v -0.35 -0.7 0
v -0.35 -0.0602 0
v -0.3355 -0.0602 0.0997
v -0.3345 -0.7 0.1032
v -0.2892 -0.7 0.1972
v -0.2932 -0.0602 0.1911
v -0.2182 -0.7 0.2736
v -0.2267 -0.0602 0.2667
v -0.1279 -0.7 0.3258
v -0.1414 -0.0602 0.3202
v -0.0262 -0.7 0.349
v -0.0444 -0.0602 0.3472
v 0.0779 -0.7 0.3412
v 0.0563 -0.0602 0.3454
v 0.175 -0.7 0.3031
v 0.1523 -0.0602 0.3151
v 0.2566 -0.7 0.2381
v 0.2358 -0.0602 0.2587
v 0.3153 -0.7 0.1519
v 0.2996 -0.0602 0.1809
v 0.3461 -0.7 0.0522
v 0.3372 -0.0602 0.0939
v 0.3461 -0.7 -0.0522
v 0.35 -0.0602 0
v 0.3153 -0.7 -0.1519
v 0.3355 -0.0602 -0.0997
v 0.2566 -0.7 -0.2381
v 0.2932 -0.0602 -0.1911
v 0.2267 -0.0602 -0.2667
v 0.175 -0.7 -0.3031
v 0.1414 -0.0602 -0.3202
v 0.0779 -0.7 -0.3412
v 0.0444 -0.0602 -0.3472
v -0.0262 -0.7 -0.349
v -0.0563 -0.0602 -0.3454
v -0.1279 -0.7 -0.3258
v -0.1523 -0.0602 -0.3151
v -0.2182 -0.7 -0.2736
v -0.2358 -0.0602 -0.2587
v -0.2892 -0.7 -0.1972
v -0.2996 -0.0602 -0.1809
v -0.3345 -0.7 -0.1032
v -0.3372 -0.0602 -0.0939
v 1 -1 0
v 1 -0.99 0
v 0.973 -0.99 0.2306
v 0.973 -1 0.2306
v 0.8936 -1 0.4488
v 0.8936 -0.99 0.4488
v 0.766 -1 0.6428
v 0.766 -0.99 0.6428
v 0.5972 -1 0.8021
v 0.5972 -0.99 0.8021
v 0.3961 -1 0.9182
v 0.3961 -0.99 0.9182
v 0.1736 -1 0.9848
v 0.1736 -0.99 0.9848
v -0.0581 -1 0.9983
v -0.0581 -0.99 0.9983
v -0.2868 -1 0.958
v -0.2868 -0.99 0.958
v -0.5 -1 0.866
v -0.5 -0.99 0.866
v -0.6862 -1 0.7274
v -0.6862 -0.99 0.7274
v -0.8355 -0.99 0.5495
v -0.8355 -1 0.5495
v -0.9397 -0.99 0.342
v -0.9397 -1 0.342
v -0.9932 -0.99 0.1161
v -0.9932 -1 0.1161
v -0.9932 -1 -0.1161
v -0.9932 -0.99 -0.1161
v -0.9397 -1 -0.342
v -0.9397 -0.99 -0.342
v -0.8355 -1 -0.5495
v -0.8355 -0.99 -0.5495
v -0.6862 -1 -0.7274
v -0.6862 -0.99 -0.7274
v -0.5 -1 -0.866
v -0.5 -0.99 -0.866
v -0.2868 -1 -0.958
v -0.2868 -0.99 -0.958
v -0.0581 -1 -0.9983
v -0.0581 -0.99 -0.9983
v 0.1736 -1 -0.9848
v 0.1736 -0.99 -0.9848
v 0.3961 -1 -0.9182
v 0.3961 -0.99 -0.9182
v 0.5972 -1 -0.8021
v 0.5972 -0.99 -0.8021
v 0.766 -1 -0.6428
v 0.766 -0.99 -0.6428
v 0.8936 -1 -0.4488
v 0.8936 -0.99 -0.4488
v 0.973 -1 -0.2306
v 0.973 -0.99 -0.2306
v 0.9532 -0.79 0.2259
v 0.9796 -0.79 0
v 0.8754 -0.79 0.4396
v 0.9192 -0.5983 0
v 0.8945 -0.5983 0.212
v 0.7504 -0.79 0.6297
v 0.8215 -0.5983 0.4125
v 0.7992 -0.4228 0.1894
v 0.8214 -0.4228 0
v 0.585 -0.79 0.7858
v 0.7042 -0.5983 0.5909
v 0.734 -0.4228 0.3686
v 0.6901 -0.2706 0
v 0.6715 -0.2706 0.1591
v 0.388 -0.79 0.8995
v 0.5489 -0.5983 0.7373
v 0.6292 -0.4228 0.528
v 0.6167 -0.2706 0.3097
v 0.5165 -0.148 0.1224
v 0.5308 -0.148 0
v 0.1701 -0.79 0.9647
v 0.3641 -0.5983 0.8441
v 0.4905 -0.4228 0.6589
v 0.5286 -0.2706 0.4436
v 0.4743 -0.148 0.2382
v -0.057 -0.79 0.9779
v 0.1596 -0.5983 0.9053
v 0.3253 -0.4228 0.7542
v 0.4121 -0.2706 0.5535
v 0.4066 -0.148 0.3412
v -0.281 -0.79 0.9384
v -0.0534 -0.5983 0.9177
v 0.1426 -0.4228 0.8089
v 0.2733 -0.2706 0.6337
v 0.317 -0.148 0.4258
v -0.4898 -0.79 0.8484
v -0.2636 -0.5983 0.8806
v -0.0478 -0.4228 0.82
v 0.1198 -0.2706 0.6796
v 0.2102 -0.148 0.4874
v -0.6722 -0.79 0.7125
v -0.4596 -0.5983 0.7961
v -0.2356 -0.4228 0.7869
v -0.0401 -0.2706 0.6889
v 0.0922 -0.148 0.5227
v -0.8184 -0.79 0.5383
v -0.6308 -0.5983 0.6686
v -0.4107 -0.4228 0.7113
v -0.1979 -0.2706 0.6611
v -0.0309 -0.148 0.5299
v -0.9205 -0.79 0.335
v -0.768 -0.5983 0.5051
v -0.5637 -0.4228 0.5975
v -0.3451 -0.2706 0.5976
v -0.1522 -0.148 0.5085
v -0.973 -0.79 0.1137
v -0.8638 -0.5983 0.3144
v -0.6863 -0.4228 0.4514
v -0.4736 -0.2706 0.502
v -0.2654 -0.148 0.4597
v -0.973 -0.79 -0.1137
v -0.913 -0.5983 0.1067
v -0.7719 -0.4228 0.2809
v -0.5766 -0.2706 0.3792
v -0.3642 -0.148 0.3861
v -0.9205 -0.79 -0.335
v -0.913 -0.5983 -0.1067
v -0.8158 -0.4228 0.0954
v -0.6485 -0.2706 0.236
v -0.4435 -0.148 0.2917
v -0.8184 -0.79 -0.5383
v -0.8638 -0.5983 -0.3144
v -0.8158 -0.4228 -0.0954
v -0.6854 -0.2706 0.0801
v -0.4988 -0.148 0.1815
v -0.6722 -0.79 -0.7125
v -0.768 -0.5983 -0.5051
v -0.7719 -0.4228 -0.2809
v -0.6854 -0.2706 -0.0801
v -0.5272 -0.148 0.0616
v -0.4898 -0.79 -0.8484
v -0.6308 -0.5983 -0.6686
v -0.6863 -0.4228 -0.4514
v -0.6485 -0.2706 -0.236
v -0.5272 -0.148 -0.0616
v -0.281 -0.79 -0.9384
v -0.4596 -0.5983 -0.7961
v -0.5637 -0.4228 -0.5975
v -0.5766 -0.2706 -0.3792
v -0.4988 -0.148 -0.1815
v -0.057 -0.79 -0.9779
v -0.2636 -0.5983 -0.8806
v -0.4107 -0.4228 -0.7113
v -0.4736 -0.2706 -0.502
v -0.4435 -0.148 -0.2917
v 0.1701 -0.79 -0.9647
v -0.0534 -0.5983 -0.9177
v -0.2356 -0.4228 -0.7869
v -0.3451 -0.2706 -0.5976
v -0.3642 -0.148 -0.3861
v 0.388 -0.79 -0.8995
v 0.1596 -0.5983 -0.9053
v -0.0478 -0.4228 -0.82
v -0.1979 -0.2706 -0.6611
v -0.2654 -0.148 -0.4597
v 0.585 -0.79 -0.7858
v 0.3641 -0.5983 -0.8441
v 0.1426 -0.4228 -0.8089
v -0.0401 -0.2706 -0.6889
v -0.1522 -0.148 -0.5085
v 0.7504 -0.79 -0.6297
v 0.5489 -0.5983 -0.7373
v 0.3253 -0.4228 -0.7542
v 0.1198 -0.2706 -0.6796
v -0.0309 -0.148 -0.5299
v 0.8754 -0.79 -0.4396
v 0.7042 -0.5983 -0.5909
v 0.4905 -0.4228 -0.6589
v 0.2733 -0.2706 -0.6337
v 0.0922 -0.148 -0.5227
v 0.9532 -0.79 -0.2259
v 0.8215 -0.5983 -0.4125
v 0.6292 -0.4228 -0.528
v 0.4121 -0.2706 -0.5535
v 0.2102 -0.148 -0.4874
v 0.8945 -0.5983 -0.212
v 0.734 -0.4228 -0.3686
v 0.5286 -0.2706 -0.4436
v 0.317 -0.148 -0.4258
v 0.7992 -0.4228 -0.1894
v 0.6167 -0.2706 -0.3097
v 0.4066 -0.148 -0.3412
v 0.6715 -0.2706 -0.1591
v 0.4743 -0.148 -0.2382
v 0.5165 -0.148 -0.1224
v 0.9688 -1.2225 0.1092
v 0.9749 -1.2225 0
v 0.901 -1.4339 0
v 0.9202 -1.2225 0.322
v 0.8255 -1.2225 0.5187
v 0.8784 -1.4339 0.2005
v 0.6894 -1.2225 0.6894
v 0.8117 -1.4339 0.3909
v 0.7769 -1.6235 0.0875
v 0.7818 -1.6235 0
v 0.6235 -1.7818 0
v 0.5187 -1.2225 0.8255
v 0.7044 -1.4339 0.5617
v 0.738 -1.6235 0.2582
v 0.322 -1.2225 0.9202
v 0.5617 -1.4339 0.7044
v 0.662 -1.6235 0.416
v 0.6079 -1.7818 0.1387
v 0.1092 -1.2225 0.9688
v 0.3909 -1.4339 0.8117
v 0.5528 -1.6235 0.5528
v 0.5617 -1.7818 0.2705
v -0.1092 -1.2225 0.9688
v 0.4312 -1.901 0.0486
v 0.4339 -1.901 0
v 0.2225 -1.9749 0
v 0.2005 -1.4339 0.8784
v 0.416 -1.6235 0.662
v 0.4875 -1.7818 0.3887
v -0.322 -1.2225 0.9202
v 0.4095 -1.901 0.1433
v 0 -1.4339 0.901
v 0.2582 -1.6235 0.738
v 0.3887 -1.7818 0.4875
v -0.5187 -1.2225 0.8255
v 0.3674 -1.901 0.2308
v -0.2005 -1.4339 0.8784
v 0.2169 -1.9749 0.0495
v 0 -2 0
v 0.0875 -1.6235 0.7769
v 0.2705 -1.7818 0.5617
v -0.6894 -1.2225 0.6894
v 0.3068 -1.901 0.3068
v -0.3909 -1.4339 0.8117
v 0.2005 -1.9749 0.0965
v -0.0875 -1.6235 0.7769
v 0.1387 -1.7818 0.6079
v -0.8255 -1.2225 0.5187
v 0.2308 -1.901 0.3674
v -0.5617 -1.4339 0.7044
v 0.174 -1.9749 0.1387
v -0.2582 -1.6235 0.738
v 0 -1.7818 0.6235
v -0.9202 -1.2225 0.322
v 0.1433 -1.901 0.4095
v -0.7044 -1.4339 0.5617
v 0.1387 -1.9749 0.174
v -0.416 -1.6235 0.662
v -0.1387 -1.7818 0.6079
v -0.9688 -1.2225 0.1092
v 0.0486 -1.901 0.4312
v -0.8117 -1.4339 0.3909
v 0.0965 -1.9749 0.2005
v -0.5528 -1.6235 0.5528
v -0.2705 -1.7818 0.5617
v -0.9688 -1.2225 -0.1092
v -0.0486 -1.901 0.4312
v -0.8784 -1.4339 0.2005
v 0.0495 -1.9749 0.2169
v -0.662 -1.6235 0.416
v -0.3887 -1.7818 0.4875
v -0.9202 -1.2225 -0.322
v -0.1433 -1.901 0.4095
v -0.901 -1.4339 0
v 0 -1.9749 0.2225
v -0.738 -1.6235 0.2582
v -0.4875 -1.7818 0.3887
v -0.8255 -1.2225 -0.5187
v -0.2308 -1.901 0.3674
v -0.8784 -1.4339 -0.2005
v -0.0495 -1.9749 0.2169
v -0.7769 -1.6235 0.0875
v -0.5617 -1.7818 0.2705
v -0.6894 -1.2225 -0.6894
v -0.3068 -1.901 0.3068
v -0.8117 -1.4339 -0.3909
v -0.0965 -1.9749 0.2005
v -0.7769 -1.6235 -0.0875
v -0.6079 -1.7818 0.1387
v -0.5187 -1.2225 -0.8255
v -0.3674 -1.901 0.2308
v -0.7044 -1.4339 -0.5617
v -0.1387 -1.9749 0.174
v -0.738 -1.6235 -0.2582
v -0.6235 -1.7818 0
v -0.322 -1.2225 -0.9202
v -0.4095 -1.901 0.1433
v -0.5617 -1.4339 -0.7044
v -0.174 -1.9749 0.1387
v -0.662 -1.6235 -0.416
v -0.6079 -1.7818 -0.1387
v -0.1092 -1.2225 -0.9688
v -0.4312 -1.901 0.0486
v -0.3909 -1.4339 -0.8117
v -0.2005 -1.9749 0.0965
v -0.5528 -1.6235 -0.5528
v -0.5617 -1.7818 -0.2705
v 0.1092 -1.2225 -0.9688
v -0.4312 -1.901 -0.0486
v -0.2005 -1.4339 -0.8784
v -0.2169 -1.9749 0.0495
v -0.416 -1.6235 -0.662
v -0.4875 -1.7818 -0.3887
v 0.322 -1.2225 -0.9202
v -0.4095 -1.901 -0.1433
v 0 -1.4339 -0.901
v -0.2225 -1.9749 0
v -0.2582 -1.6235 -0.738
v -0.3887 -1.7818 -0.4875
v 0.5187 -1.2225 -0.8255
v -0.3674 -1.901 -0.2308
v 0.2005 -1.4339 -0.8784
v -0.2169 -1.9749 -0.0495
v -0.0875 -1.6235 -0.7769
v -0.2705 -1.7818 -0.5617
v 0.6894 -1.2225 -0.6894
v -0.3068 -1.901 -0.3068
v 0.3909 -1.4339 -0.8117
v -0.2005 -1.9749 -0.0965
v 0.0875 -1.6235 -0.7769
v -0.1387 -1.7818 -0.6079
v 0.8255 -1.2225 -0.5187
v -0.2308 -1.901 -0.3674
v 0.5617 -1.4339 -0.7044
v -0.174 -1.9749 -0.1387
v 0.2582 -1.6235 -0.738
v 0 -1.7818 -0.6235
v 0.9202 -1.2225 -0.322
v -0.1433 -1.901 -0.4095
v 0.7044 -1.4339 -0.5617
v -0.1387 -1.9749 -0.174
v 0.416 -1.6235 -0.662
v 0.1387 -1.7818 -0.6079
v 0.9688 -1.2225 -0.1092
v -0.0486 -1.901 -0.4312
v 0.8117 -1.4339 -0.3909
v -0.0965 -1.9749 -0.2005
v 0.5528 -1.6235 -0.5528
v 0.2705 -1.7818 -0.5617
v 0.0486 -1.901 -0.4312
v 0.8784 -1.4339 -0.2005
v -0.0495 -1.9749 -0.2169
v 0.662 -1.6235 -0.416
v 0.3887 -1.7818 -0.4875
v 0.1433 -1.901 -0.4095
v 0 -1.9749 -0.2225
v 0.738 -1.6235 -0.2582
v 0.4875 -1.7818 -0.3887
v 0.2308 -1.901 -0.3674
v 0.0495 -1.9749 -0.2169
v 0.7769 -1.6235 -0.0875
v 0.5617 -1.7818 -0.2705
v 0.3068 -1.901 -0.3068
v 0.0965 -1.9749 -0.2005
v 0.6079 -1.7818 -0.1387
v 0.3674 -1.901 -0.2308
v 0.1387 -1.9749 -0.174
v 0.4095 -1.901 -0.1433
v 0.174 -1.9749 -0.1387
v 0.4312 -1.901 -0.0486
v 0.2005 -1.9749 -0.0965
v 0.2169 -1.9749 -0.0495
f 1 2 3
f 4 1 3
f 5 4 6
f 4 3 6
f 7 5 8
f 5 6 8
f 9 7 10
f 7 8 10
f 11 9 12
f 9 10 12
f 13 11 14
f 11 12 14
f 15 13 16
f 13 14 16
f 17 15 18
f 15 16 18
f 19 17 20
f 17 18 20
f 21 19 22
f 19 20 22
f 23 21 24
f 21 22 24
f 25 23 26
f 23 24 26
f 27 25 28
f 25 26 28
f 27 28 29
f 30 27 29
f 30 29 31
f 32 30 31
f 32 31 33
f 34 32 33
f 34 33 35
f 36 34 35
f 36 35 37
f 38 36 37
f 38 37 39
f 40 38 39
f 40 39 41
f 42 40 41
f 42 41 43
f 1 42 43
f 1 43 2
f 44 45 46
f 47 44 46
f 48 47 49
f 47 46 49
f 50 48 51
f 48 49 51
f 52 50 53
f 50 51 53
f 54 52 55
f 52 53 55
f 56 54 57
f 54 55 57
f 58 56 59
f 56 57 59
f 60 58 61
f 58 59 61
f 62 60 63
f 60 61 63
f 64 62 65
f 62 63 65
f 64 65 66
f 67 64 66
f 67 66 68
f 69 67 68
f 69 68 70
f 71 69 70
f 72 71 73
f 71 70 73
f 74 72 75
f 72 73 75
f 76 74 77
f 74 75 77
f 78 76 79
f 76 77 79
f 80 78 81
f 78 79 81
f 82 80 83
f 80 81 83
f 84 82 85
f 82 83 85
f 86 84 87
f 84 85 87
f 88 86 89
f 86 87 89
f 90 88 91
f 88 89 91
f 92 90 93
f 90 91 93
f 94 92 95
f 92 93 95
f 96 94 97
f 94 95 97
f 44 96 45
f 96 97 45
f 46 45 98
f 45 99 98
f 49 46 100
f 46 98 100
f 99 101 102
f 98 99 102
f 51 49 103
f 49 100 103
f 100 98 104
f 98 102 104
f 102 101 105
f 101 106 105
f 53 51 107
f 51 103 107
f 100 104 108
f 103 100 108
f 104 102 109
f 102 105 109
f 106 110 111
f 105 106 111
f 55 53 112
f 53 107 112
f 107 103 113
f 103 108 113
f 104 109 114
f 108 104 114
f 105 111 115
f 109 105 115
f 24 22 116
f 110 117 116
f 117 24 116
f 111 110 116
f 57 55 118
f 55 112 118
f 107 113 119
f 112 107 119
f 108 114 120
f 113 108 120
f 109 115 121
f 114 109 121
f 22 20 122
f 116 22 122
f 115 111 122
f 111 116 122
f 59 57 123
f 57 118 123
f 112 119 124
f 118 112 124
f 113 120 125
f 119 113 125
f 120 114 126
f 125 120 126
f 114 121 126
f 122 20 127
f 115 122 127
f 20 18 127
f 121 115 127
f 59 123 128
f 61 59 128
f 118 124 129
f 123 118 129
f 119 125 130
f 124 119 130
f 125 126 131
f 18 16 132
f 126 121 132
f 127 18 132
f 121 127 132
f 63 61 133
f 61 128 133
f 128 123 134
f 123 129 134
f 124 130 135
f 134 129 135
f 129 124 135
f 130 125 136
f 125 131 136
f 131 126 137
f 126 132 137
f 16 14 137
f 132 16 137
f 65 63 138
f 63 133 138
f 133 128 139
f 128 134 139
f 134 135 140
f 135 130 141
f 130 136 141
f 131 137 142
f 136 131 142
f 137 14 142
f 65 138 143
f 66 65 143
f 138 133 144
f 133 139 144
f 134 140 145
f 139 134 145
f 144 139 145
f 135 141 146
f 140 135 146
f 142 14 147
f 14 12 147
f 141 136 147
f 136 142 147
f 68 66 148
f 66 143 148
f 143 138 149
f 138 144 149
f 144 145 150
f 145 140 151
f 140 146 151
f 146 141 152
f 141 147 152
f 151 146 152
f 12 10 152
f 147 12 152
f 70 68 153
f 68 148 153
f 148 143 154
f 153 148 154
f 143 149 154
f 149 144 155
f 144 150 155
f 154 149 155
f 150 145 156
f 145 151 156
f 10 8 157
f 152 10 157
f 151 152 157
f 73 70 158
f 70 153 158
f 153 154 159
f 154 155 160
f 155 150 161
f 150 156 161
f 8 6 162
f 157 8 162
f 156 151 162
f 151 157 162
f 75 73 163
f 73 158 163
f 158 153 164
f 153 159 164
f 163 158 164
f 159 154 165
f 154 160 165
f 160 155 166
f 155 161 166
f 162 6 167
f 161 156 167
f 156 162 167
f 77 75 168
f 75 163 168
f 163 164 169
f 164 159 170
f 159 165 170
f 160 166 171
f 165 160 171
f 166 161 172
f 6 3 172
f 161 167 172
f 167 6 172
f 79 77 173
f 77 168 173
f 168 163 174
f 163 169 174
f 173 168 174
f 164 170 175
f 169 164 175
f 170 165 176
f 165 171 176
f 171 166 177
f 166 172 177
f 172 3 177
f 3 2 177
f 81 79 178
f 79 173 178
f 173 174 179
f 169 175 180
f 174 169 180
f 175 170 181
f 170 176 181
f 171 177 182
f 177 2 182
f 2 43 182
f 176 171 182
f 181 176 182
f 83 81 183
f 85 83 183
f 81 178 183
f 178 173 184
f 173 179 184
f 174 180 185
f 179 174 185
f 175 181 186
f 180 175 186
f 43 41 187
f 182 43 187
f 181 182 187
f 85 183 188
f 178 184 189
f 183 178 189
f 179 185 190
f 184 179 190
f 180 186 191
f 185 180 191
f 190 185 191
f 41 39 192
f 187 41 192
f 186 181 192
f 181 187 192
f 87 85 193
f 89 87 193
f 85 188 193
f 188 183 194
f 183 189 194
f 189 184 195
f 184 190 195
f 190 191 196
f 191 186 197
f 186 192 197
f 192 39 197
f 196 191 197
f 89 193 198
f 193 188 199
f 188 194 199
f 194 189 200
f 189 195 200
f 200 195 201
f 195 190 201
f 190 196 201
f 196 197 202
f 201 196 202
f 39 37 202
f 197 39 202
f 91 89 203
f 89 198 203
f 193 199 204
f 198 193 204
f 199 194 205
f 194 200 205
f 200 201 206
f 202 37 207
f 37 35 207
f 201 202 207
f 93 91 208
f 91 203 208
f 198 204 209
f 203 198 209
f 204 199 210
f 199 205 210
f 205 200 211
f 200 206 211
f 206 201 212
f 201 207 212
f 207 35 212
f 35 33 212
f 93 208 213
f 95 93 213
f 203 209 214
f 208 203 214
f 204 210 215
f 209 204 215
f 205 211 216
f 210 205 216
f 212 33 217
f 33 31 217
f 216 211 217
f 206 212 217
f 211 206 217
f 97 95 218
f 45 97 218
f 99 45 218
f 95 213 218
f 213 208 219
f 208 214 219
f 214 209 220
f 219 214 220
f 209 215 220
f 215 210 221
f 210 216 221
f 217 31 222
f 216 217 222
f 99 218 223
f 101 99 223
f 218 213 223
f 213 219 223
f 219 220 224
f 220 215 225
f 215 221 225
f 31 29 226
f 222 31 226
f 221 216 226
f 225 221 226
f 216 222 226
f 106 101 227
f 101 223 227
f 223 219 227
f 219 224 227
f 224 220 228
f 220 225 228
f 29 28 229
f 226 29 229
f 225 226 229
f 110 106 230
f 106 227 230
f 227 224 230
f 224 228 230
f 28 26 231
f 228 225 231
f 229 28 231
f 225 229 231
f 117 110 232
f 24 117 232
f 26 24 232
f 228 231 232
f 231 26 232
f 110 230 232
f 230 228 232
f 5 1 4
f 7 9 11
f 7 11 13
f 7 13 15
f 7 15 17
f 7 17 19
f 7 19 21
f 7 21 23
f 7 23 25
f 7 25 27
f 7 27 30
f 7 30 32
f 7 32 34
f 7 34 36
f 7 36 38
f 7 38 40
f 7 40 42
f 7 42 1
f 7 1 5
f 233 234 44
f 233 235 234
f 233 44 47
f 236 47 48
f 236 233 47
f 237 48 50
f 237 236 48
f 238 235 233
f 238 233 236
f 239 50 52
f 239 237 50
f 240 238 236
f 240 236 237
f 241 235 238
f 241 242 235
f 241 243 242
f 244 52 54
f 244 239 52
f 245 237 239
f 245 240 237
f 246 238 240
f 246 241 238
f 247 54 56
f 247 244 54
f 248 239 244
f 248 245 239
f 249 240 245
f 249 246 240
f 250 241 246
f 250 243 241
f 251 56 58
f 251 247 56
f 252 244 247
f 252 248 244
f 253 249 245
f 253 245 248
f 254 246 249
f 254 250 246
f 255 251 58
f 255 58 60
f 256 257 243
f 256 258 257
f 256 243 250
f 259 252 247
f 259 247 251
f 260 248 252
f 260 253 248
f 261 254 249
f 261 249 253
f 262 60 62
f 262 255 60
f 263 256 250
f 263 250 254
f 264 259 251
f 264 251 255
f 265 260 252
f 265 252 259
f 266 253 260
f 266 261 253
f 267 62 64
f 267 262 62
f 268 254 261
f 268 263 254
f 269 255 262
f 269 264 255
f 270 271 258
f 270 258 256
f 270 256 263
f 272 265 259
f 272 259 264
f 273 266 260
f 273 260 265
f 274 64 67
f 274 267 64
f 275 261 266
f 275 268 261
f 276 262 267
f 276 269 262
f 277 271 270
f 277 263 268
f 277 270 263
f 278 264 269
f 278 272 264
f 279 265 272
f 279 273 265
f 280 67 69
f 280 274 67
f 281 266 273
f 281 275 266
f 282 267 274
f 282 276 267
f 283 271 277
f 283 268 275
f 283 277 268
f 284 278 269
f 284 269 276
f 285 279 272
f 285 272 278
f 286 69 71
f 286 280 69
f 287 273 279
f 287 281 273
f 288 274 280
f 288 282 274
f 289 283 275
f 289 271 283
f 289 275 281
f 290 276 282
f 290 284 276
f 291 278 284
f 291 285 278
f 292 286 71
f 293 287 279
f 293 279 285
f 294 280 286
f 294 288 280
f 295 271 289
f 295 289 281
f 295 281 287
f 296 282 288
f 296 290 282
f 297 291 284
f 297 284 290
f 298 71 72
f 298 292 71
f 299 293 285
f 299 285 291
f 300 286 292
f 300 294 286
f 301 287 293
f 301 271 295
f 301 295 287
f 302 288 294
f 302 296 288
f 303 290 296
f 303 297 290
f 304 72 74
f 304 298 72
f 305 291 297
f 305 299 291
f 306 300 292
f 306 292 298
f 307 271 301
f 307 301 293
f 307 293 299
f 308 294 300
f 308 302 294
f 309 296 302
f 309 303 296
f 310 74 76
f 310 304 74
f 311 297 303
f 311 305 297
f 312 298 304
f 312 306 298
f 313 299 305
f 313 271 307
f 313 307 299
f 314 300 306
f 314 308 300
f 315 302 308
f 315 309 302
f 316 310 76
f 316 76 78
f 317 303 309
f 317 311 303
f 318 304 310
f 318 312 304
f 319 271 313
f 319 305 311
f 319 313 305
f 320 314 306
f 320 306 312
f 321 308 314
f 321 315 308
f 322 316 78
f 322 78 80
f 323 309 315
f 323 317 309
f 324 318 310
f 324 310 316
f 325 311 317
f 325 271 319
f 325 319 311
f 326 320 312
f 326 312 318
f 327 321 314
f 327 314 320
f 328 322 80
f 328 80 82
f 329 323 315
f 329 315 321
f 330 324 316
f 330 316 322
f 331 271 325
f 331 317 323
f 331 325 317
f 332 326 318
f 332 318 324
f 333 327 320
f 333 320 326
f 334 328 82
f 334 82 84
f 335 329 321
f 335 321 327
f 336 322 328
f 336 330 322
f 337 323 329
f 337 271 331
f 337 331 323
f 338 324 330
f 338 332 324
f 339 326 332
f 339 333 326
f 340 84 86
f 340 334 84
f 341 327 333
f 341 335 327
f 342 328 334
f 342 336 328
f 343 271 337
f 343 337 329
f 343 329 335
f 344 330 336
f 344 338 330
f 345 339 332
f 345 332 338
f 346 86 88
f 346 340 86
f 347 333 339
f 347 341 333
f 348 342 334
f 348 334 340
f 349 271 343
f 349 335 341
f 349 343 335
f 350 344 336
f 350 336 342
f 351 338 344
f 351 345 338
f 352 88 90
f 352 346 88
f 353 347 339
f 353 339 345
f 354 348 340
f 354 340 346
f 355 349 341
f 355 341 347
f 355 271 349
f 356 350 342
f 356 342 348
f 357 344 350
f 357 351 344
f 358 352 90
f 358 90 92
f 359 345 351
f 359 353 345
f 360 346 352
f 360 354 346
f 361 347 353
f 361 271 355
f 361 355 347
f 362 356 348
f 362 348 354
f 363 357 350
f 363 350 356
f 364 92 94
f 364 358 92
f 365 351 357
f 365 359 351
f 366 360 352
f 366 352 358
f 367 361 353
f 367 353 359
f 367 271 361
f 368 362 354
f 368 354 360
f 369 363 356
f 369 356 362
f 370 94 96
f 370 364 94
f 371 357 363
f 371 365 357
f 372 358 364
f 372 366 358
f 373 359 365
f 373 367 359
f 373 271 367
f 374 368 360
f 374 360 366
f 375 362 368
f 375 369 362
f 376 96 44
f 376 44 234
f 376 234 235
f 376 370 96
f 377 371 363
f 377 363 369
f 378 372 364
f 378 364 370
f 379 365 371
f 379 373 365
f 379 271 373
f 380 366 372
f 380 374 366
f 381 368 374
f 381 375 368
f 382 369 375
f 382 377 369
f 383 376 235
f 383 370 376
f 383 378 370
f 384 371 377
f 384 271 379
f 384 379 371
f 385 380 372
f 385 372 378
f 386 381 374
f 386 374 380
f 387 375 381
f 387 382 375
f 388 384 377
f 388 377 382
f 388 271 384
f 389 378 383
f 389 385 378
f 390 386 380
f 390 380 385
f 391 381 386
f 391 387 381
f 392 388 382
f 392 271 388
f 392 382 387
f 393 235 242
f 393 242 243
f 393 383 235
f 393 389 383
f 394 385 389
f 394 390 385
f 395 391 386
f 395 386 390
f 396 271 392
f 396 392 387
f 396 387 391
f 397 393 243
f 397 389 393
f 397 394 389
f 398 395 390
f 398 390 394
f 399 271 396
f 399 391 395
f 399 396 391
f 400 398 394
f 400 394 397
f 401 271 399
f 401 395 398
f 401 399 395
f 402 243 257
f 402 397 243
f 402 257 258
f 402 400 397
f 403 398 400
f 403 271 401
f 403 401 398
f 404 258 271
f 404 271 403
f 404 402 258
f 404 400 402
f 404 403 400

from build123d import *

# Parameters (mm, degrees)
F0_R     = 1
F1_DEPTH = 2
F2_R     = 1
F3_R     = 0.99
F4_R     = 0.35
F5_DEPTH = 0.7


with BuildPart() as f1:
    # F0 (on Front) → F1 (new body)
    with BuildSketch(Plane.XZ):
        Circle(F0_R)
    extrude(amount=F1_DEPTH)

    # F2
    f2_edges = [f1.edges().sort_by_distance(p)[0] for p in [
        (-1, -2, 0),
    ]]
    fillet(f2_edges, radius=F2_R)

    # F3
    f3_edges = [f1.edges().sort_by_distance(p)[0] for p in [
        (-1, 0, 0),
    ]]
    fillet(f3_edges, radius=F3_R)

    # F4 (on face) → F5 (cut)
    with BuildSketch(Plane(origin=(0, 0, 0), x_dir=(-1, 0, 0), z_dir=(0, 1, 0))):
        Circle(F4_R)
    extrude(amount=-F5_DEPTH, mode=Mode.SUBTRACT)


solid = f1.part
